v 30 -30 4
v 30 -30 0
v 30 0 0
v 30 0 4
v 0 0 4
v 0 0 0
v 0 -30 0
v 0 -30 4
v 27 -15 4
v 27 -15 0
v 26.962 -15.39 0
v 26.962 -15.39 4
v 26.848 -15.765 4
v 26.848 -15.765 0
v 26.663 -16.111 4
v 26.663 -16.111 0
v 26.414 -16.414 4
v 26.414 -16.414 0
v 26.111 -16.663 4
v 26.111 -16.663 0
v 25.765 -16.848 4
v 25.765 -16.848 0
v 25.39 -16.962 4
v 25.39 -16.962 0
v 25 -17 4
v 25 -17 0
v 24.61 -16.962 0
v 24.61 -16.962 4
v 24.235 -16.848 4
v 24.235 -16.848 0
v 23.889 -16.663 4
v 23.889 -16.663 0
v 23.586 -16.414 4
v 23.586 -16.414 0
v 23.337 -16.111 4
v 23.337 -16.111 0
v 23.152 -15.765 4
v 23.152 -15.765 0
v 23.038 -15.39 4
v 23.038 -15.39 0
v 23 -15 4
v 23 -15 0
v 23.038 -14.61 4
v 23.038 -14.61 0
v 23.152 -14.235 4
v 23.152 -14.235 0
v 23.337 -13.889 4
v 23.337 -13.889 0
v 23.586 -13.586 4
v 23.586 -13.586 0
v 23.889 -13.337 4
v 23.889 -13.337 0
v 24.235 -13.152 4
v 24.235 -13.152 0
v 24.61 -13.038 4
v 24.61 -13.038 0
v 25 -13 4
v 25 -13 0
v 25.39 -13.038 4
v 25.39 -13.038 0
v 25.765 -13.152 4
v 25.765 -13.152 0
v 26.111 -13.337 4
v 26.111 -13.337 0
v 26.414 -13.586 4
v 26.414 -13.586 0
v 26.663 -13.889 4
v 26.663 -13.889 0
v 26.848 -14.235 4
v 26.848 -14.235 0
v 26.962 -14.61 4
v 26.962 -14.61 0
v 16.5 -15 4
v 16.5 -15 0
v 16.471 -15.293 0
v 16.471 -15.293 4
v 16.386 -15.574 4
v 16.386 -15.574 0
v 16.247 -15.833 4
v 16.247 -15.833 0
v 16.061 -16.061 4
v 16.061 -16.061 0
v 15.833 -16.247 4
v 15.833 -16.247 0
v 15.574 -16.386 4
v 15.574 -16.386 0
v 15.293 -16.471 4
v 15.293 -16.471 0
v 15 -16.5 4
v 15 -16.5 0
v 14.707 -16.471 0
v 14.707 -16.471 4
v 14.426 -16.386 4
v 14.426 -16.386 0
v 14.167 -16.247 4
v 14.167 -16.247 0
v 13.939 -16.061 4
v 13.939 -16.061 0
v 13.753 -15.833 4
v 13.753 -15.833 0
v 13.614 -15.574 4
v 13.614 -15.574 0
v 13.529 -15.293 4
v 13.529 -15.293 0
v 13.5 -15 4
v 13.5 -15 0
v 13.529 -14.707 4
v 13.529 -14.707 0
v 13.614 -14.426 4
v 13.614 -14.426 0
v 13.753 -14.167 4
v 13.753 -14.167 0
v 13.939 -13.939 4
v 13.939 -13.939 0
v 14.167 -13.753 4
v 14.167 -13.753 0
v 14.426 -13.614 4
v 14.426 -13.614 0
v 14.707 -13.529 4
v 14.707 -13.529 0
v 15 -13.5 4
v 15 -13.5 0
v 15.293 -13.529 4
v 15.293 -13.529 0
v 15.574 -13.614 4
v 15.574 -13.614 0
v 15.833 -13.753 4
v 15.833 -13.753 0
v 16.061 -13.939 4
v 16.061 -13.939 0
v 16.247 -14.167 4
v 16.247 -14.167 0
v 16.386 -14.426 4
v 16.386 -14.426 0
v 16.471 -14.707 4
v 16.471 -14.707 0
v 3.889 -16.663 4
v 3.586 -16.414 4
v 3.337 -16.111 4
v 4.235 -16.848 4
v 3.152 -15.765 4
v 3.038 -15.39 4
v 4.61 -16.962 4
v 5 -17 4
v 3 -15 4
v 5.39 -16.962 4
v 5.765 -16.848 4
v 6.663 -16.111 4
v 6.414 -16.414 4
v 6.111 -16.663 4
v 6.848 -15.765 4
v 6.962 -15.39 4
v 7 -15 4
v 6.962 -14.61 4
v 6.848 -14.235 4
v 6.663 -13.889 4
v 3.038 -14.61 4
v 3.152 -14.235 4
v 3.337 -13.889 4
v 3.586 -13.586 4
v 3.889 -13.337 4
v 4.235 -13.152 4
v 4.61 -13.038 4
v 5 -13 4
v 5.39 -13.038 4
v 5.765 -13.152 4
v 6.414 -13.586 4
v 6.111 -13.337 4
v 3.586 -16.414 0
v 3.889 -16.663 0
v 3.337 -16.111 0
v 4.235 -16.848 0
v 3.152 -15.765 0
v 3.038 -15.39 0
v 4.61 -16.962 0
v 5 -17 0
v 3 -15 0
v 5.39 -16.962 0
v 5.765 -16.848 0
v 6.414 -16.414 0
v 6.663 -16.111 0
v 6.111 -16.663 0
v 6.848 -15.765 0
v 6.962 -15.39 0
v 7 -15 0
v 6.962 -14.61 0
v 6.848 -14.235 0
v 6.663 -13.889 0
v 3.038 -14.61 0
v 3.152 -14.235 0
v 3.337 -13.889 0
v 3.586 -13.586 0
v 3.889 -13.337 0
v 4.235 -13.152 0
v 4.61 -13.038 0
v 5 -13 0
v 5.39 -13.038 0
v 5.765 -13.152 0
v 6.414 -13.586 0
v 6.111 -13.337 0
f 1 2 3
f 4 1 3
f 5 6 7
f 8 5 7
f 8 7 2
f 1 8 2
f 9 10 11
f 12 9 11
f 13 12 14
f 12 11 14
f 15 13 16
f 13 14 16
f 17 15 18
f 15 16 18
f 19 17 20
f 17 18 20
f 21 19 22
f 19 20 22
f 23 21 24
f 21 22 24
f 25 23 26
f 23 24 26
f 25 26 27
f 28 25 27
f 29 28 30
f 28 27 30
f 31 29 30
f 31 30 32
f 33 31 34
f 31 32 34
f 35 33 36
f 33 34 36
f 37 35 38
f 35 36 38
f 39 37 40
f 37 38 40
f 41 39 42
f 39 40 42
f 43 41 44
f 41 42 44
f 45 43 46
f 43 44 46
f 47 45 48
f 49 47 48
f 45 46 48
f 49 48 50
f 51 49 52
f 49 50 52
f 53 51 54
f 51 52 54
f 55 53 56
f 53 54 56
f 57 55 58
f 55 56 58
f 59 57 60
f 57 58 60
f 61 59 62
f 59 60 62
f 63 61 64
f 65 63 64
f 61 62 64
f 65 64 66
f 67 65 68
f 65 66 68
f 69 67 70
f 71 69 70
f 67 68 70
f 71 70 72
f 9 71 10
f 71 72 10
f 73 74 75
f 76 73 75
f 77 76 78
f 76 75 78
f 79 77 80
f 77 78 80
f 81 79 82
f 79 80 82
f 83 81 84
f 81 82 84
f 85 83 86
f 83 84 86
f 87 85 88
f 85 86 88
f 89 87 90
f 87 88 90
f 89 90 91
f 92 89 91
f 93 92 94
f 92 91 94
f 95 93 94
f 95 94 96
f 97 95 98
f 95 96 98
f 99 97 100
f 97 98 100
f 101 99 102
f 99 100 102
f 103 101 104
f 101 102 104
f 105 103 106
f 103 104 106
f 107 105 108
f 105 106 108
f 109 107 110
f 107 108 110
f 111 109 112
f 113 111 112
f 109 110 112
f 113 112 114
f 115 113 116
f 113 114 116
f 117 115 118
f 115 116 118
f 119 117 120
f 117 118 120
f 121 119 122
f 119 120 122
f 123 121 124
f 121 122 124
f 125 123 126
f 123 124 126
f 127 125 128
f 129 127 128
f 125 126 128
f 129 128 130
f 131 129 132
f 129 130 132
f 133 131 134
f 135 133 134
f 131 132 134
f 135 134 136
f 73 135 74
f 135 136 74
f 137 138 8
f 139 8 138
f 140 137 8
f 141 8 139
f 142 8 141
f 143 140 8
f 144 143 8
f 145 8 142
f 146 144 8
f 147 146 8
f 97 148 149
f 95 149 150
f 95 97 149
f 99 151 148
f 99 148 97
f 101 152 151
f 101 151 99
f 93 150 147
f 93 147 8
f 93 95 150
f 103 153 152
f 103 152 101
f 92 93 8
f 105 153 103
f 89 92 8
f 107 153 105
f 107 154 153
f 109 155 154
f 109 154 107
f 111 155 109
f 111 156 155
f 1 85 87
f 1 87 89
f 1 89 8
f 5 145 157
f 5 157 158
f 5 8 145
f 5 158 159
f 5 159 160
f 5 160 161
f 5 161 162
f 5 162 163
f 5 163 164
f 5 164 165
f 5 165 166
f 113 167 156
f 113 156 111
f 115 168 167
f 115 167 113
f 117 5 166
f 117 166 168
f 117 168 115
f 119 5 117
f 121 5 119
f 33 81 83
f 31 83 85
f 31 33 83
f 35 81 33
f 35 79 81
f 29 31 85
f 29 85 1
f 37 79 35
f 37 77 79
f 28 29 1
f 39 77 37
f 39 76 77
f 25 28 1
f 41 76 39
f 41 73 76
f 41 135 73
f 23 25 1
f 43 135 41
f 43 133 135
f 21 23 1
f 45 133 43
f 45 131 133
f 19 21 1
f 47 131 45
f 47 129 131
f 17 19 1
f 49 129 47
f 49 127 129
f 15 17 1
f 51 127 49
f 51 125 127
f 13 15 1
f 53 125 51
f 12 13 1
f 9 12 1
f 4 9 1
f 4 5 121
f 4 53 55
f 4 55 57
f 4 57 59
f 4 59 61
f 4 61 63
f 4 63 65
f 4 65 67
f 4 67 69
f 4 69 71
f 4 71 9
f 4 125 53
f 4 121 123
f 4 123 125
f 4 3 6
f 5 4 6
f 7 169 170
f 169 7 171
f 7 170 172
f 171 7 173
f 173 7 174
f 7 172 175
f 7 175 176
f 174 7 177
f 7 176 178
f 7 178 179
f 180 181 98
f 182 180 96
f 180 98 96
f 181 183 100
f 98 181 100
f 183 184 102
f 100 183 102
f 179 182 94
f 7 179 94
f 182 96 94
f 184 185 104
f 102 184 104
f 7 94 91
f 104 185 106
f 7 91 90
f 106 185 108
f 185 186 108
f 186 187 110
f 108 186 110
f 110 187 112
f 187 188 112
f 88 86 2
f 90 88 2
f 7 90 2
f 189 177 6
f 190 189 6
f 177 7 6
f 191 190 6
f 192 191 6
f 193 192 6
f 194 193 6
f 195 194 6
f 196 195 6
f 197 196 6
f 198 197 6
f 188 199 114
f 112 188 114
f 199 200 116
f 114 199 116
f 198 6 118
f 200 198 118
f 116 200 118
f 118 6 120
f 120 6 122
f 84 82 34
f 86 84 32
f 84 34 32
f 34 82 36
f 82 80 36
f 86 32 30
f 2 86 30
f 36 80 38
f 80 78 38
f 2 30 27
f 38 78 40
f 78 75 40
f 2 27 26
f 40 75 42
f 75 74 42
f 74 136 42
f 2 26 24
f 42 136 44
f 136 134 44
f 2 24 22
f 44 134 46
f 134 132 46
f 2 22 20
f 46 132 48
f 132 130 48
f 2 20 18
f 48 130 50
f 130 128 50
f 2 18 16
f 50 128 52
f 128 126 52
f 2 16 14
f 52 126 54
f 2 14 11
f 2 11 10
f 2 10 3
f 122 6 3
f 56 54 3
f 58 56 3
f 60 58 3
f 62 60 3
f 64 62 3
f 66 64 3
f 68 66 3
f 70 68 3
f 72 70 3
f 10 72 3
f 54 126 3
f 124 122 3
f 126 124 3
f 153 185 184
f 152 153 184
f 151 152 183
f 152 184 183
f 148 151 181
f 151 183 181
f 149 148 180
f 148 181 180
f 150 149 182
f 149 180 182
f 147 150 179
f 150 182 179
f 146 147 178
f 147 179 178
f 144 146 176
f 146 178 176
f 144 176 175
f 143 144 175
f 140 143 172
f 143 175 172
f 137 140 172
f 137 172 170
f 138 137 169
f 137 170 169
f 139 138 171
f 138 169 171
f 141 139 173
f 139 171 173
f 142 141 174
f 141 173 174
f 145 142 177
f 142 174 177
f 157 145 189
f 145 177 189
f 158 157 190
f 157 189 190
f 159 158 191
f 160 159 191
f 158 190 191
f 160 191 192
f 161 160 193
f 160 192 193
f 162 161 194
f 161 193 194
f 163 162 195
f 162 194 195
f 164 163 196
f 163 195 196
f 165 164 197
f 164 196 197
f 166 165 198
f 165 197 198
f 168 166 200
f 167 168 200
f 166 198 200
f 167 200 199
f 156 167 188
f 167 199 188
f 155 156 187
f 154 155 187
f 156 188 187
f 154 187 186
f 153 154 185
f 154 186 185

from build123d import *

# Parameters (mm, degrees)
BOSS_EXTRUDE1_DEPTH = 4


with BuildPart() as part:
    # Sketch1 → Boss-Extrude1 (new body)
    with BuildSketch(Plane.XY):
        with BuildLine():
            ThreePointArc((2.5, -15), (15, -2.5), (27.5, -15))
            Line((27.5, -15), (30, -15))
            Line((30, -15), (30, 0))
            Line((30, 0), (0, 0))
            Line((0, 0), (0, -15))
            Line((0, -15), (2.5, -15))
        make_face()
        with BuildLine():
            Line((30, -15), (27.5, -15))
            ThreePointArc((27.5, -15), (15, -27.5), (2.5, -15))
            Line((2.5, -15), (0, -15))
            Line((0, -15), (0, -30))
            Line((0, -30), (30, -30))
            Line((30, -30), (30, -15))
        make_face()
        with BuildLine():
            ThreePointArc((23, -15), (25, -13), (27, -15))
            Line((27, -15), (27.5, -15))
            ThreePointArc((27.5, -15), (15, -2.5), (2.5, -15))
            Line((2.5, -15), (3, -15))
            ThreePointArc((3, -15), (5, -13), (7, -15))
            Line((7, -15), (13.5, -15))
            ThreePointArc((13.5, -15), (15, -13.5), (16.5, -15))
            Line((16.5, -15), (23, -15))
        make_face()
        with BuildLine():
            Line((27.5, -15), (27, -15))
            ThreePointArc((27, -15), (25, -17), (23, -15))
            Line((23, -15), (16.5, -15))
            ThreePointArc((16.5, -15), (15, -16.5), (13.5, -15))
            Line((13.5, -15), (7, -15))
            ThreePointArc((7, -15), (5, -17), (3, -15))
            Line((3, -15), (2.5, -15))
            ThreePointArc((2.5, -15), (15, -27.5), (27.5, -15))
        make_face()
    extrude(amount=BOSS_EXTRUDE1_DEPTH)


solid = part.part
